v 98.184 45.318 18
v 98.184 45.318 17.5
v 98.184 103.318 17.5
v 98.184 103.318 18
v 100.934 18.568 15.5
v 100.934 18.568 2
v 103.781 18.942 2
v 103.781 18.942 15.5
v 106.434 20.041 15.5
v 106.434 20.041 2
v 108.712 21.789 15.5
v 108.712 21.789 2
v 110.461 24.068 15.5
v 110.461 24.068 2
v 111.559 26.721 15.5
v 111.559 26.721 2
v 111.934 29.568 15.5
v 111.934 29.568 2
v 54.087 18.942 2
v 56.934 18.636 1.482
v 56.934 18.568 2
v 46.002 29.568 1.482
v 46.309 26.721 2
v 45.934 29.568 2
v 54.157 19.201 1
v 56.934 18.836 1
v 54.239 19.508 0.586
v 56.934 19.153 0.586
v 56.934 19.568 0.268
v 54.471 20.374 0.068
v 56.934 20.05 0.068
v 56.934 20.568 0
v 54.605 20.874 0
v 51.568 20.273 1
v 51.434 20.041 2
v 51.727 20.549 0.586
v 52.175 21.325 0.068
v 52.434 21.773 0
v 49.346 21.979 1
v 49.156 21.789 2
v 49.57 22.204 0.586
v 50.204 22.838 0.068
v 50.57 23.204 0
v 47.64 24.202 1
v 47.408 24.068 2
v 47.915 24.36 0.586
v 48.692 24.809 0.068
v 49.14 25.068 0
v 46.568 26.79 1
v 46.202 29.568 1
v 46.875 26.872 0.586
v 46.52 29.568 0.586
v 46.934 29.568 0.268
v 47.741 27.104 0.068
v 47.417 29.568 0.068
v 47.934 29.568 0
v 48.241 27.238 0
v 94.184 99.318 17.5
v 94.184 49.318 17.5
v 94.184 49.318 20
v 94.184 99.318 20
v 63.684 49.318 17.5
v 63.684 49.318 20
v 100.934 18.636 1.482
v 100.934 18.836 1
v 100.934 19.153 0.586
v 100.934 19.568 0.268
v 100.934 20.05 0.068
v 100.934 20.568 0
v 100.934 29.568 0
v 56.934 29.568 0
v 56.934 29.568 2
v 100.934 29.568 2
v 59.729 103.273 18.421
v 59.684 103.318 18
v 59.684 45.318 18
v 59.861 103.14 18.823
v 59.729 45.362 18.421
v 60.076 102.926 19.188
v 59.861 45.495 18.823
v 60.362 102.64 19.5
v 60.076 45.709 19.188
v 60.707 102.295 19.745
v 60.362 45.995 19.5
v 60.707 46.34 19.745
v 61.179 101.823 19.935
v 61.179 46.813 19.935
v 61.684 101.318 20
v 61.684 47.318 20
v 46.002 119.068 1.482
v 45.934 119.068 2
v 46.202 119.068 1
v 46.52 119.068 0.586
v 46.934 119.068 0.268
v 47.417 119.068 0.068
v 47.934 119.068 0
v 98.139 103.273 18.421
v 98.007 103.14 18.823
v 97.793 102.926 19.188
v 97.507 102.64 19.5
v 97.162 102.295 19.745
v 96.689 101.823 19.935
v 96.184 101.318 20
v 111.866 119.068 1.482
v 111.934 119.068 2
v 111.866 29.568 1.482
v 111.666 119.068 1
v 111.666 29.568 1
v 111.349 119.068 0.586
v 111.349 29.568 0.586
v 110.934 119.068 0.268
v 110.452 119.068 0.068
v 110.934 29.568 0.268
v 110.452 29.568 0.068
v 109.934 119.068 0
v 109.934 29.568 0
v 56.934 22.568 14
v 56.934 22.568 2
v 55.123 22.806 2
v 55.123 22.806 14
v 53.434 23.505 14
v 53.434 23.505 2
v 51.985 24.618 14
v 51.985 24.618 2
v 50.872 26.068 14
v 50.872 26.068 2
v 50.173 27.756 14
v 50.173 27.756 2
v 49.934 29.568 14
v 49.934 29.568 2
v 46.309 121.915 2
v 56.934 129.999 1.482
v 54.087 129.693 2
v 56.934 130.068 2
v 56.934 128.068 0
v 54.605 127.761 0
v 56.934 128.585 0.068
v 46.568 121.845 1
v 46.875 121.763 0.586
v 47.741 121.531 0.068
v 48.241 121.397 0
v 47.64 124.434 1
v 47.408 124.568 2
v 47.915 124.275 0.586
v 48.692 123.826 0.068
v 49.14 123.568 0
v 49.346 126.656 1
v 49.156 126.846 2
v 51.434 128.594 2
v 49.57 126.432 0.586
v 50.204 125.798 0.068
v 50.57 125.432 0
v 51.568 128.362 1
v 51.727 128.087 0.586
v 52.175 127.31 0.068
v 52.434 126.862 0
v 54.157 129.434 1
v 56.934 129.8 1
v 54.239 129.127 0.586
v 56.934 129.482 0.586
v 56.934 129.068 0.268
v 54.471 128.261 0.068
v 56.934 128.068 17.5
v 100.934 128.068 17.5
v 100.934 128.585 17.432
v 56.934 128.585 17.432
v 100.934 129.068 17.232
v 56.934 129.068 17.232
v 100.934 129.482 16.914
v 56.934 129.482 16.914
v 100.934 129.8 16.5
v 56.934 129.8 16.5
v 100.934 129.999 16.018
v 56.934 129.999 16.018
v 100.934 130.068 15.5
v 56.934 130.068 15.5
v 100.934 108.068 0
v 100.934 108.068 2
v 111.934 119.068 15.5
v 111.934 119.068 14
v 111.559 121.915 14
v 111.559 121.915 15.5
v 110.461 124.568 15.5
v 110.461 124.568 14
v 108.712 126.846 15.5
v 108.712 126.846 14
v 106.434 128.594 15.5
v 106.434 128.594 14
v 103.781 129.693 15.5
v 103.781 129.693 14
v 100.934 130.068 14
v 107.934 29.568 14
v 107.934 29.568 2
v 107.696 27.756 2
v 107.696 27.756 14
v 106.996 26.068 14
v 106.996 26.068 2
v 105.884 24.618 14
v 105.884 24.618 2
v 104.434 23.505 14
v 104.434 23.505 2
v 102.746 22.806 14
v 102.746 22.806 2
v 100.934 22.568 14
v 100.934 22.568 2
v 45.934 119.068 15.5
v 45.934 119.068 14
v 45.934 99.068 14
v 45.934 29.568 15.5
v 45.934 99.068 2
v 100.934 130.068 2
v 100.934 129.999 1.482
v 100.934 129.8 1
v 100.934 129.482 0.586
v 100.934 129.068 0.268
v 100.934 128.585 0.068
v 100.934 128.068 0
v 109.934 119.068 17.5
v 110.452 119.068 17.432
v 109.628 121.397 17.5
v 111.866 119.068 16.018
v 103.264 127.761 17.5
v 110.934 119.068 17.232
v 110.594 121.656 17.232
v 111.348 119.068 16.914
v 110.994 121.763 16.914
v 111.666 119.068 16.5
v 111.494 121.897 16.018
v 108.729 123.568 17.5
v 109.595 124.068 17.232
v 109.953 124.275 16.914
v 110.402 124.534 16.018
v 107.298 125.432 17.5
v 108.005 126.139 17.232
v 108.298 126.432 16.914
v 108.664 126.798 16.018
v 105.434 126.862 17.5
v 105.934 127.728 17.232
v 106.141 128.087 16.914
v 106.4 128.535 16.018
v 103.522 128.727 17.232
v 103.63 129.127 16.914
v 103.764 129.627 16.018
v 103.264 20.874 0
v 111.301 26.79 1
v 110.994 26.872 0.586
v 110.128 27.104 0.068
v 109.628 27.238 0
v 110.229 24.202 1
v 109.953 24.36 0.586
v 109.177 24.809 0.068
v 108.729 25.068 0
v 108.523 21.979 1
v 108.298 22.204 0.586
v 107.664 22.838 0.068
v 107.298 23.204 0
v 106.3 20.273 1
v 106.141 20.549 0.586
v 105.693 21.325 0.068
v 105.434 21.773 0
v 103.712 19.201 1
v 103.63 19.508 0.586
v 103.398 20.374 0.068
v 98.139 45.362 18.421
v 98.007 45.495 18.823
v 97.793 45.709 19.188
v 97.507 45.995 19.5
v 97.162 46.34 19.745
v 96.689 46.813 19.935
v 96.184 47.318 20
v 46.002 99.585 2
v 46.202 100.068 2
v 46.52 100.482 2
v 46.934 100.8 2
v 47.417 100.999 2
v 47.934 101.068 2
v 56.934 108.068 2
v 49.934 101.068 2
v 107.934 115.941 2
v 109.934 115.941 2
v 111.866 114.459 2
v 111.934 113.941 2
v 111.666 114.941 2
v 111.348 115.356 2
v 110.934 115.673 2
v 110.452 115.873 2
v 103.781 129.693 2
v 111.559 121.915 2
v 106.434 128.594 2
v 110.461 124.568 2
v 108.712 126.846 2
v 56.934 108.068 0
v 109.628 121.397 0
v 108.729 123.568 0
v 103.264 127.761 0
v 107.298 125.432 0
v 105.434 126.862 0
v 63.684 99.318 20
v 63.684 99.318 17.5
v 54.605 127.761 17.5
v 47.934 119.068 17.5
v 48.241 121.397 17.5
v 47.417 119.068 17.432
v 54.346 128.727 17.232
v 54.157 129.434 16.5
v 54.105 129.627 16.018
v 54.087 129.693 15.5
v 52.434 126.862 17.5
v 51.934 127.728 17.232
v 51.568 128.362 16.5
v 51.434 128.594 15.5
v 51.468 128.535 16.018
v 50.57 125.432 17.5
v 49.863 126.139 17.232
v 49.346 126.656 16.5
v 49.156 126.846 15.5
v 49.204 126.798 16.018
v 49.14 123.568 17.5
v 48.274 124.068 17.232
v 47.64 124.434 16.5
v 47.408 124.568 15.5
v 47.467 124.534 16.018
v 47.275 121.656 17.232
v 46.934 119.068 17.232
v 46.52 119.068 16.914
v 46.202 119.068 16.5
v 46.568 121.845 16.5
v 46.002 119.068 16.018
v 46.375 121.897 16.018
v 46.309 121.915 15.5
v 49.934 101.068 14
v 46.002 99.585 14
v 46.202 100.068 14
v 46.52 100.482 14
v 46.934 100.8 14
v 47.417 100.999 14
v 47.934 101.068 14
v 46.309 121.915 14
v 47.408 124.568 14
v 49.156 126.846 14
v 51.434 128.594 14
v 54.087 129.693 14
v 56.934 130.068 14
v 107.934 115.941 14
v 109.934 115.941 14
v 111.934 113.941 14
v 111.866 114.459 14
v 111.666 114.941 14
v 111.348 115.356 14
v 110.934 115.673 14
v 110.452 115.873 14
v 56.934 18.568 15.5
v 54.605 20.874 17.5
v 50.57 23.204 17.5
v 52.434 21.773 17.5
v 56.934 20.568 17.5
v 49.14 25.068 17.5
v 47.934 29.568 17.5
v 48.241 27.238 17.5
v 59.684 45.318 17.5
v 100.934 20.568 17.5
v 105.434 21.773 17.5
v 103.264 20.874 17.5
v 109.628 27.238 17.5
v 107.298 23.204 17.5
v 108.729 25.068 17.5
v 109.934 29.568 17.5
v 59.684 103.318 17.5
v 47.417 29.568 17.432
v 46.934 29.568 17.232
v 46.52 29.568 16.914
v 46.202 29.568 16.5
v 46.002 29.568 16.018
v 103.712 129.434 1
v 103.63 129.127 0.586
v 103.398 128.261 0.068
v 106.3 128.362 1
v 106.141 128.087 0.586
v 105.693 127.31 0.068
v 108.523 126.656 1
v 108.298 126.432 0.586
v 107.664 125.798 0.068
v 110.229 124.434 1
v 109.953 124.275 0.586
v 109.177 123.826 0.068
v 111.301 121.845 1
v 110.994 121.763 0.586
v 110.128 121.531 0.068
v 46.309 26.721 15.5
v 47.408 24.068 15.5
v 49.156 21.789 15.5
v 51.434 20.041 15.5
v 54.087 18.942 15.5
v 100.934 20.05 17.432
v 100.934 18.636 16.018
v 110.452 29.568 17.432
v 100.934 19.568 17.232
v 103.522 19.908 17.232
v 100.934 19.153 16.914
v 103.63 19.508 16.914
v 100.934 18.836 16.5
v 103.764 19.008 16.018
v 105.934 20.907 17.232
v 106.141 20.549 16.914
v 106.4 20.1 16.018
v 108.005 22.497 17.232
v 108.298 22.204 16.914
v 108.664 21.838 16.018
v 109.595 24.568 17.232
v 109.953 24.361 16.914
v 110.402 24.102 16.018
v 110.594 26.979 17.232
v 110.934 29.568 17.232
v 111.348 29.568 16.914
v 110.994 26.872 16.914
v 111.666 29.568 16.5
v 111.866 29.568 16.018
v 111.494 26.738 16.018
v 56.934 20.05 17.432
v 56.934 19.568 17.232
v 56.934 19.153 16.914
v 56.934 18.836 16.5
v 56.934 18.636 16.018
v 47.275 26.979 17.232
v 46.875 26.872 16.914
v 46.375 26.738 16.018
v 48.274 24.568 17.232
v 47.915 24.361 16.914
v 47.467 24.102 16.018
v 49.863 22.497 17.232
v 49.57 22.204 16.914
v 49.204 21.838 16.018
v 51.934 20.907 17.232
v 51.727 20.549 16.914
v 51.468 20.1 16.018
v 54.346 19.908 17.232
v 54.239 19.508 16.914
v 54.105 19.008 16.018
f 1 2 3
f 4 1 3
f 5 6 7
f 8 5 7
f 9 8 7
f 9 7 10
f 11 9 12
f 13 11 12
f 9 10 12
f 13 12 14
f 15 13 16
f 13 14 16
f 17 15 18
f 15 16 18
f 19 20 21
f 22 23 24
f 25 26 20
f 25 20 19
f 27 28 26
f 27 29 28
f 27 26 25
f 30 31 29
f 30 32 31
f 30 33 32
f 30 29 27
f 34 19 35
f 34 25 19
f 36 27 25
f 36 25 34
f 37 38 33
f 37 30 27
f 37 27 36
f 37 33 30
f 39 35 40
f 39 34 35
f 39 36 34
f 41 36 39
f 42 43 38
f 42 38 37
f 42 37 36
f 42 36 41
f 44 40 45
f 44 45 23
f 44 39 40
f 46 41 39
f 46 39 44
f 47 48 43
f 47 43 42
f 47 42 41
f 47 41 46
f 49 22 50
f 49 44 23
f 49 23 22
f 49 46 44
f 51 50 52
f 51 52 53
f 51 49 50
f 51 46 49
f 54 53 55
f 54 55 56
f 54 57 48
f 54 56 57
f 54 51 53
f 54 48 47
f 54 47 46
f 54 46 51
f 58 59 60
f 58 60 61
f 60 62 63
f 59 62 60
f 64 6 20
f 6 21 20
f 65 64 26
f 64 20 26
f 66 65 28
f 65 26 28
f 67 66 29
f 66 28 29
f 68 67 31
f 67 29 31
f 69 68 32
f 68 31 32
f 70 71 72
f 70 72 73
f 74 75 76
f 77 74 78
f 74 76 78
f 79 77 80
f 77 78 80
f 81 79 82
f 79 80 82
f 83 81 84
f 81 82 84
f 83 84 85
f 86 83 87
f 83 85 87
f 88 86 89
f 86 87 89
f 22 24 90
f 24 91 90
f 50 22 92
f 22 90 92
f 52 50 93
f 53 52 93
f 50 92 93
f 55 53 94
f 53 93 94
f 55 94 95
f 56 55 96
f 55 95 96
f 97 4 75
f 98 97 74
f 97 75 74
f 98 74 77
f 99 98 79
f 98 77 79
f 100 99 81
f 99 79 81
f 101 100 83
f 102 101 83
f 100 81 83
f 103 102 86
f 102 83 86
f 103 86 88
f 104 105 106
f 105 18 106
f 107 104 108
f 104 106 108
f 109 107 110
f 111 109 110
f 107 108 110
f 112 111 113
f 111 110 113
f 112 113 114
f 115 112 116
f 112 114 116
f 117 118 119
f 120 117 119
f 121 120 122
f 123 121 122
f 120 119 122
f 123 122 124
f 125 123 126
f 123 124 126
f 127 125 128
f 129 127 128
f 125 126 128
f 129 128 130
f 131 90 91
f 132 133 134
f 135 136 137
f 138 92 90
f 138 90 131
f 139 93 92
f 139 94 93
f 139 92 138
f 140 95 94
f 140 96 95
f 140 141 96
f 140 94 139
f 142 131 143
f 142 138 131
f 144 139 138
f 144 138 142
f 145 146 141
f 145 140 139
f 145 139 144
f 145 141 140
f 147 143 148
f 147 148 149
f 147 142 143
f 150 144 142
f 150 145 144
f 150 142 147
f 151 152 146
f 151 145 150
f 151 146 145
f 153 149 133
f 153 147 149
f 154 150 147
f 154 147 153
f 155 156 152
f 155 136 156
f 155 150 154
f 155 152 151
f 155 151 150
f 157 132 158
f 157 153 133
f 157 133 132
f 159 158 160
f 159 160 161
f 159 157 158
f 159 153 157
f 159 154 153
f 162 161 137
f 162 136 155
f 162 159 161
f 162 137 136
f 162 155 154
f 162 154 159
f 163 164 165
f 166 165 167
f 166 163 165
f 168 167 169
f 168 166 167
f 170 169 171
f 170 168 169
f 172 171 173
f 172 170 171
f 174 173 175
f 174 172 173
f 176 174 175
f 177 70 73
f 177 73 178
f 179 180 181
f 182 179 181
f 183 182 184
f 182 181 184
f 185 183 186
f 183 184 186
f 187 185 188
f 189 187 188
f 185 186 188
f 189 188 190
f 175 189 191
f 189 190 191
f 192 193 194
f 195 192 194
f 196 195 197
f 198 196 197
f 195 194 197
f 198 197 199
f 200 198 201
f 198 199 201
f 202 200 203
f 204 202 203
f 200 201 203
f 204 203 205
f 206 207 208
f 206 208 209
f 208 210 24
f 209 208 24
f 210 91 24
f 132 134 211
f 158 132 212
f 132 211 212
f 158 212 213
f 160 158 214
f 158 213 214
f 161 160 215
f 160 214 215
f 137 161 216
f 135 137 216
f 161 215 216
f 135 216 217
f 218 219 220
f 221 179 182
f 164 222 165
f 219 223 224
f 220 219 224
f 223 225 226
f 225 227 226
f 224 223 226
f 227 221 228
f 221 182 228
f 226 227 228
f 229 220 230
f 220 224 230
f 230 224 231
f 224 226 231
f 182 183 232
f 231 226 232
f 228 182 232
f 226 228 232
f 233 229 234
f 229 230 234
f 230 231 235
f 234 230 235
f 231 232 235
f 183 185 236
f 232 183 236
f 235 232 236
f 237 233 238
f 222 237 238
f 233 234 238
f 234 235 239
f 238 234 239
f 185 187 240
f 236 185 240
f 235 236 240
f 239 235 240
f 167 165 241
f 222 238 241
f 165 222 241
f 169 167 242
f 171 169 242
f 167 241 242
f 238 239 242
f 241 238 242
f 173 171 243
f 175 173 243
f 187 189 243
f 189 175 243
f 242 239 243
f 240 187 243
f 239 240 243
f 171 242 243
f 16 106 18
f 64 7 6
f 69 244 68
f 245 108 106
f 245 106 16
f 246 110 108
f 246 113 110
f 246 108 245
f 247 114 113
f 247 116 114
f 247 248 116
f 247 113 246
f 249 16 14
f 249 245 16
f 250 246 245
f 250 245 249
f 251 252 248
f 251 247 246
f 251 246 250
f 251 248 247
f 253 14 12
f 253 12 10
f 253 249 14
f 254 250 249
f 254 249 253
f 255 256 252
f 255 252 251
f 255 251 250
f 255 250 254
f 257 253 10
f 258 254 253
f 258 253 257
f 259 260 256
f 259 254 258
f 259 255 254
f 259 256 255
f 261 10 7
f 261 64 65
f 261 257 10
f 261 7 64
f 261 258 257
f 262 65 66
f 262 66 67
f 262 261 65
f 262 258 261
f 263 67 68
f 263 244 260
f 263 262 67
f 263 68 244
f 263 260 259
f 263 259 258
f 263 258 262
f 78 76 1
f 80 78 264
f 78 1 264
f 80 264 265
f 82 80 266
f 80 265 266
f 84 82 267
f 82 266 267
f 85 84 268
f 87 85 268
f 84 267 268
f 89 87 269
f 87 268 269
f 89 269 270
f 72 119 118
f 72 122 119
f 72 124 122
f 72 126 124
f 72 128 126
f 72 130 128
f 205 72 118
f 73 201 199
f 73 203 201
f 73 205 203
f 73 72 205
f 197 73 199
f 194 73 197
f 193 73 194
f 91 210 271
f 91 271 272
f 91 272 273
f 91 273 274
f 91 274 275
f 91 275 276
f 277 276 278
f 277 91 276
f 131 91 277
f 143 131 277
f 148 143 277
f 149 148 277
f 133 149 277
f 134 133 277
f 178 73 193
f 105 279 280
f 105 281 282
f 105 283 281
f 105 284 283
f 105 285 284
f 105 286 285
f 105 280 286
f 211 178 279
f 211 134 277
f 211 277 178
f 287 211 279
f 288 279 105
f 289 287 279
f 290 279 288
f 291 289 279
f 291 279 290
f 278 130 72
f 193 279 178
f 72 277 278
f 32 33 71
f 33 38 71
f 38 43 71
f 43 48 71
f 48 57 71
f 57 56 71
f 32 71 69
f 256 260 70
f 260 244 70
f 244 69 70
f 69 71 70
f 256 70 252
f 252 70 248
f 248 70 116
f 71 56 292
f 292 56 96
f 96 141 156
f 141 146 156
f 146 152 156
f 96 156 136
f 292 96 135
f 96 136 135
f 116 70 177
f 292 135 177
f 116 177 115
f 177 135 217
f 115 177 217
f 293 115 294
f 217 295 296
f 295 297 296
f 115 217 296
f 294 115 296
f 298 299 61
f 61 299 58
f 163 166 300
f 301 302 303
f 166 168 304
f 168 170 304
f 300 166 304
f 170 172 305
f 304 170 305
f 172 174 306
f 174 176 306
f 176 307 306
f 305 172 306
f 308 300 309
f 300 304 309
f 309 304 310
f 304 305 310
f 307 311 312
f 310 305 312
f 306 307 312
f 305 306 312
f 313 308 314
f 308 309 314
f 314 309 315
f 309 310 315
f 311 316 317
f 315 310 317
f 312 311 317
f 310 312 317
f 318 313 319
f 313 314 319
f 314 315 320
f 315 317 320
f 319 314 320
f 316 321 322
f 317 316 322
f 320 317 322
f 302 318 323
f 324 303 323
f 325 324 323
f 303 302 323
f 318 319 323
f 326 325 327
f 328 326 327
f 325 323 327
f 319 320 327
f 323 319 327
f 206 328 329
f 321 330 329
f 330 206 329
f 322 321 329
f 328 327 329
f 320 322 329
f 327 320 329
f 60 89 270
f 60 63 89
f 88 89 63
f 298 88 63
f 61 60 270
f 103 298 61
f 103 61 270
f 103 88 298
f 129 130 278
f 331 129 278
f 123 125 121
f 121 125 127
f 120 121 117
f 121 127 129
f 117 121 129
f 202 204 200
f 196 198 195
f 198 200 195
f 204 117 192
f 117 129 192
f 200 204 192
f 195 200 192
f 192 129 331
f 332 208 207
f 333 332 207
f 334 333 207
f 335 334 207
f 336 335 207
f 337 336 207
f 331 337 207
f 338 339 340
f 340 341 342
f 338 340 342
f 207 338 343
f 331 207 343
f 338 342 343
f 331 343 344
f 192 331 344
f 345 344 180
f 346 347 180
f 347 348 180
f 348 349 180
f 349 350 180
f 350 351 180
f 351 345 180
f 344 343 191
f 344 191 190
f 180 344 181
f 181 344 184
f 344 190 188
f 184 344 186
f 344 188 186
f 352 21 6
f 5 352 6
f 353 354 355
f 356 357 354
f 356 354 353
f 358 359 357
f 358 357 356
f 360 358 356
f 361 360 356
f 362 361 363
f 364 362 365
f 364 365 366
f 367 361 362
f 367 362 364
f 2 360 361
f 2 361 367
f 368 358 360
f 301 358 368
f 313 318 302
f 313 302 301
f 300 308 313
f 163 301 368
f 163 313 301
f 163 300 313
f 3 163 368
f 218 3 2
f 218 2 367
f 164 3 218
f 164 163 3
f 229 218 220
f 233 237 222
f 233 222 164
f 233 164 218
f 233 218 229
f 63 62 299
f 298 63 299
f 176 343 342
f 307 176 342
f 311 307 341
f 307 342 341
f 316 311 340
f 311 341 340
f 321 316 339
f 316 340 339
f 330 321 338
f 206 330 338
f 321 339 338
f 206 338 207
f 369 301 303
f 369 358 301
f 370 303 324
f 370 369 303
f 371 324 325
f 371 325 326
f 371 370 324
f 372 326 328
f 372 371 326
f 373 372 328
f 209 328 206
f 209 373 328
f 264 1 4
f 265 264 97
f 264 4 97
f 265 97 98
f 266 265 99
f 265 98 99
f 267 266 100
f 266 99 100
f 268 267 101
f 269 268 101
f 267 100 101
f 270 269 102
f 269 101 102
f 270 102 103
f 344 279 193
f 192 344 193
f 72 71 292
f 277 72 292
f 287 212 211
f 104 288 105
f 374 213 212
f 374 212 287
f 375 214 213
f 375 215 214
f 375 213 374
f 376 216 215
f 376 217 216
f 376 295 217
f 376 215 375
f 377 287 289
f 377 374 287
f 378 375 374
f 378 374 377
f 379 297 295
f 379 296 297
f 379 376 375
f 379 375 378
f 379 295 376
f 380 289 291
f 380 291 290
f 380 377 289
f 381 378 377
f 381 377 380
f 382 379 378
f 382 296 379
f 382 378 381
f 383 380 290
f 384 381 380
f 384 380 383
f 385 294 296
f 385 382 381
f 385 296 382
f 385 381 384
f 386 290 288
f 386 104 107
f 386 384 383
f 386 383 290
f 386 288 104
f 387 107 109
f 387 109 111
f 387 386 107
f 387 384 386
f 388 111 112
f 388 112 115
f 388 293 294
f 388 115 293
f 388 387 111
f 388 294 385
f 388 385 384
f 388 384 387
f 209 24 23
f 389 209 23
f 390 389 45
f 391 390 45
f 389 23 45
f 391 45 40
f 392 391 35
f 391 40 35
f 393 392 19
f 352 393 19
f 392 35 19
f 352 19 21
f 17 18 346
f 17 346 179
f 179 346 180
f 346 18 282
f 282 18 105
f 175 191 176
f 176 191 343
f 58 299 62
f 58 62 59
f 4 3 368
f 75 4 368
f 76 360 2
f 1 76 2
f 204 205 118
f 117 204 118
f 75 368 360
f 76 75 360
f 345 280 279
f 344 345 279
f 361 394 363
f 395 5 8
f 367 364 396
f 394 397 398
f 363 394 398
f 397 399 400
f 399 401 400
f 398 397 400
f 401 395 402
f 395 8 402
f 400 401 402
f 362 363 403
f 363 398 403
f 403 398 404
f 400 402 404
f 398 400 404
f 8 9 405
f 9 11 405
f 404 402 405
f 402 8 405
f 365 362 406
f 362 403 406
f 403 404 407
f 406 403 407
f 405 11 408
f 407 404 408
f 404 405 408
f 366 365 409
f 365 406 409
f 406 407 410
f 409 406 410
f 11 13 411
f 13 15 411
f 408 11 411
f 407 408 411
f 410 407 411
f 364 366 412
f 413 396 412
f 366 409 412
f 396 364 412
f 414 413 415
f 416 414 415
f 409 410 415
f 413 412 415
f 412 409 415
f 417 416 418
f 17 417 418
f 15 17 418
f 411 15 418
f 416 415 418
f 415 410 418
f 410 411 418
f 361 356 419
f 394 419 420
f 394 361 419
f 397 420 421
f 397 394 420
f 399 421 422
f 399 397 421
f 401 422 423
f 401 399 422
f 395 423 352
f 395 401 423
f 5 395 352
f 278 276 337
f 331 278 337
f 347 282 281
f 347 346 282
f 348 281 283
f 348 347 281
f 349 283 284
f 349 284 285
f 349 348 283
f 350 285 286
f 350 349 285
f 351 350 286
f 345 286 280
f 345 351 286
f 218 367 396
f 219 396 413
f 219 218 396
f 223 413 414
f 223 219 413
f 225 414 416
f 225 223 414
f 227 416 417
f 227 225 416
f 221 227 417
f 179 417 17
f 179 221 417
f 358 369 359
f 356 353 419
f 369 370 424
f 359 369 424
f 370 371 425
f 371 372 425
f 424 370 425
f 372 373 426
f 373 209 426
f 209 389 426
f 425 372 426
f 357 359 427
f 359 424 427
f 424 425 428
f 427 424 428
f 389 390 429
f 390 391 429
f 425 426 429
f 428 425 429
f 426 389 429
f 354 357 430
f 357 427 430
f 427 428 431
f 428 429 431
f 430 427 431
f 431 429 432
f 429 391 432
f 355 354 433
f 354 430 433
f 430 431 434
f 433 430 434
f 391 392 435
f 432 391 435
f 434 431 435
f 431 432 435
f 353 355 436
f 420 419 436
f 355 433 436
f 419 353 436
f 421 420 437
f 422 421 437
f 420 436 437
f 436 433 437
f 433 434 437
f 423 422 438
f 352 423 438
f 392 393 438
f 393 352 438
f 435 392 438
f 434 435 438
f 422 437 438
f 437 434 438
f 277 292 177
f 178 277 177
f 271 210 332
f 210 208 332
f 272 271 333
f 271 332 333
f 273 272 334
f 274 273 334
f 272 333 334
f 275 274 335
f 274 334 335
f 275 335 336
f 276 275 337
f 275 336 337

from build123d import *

# Parameters (mm, degrees)
CROQUIS1_W              = 44
CROQUIS1_H              = 78.5
SALIENTE_EXTRUIR1_DEPTH = 2
SALIENTE_EXTRUIR2_DEPTH = 12
CROQUIS3_W              = 44
CROQUIS3_H              = 78.5
SALIENTE_EXTRUIR3_DEPTH = 3.5
CROQUIS4_W              = 30.5
CROQUIS4_H              = 50
SALIENTE_EXTRUIR4_DEPTH = 2.5
CROQUIS6_W              = 12
CROQUIS6_H              = 14.873801133
CORTAR_EXTRUIR3_DEPTH   = 4
REDONDEO2_R             = 2
REDONDEO3_R             = 2
REDONDEO4_R             = 2
REDONDEO5_R             = 2
REDONDEO6_R             = 2


with BuildPart() as part:
    # Croquis1 → Saliente-Extruir1 (new body)
    # profile 1 of 2: a face of its own
    with BuildSketch(Plane.XY):
        with BuildLine():
            Line((45.934272818, 29.567618865), (45.934272818, 119.067618865))
            ThreePointArc((45.934272818, 119.067618865), (49.156098225, 126.845793458), (56.934272818, 130.067618865))
            Line((56.934272818, 130.067618865), (100.934272818, 130.067618865))
            ThreePointArc((100.934272818, 130.067618865), (108.712447411, 126.845793458), (111.934272818, 119.067618865))
            Line((111.934272818, 119.067618865), (111.934272818, 29.567618865))
            ThreePointArc((111.934272818, 29.567618865), (108.712447411, 21.789444272), (100.934272818, 18.567618865))
            Line((100.934272818, 18.567618865), (56.934272818, 18.567618865))
            ThreePointArc((56.934272818, 18.567618865), (49.156098225, 21.789444272), (45.934272818, 29.567618865))
        make_face()
        with BuildLine():
            ThreePointArc((56.934272818, 126.067618865), (51.98452535, 124.017366333), (49.934272818, 119.067618865))
            Line((49.934272818, 119.067618865), (49.934272818, 29.567618865))
            ThreePointArc((49.934272818, 29.567618865), (51.98452535, 24.617871397), (56.934272818, 22.567618865))
            Line((56.934272818, 22.567618865), (100.934272818, 22.567618865))
            ThreePointArc((100.934272818, 22.567618865), (105.884020287, 24.617871397), (107.934272818, 29.567618865))
            Line((107.934272818, 29.567618865), (107.934272818, 119.067618865))
            ThreePointArc((107.934272818, 119.067618865), (105.884020287, 124.017366333), (100.934272818, 126.067618865))
            Line((100.934272818, 126.067618865), (56.934272818, 126.067618865))
        make_face(mode=Mode.SUBTRACT)
    # profile 2 of 2: a face of its own
    with BuildSketch(Plane.XY):
        with BuildLine():
            Line((100.934272818, 126.067618865), (56.934272818, 126.067618865))
            ThreePointArc((56.934272818, 126.067618865), (51.98452535, 124.017366333), (49.934272818, 119.067618865))
            Line((49.934272818, 119.067618865), (49.934272818, 29.567618865))
            ThreePointArc((49.934272818, 29.567618865), (51.98452535, 24.617871397), (56.934272818, 22.567618865))
            Line((56.934272818, 22.567618865), (100.934272818, 22.567618865))
            ThreePointArc((100.934272818, 22.567618865), (105.884020287, 24.617871397), (107.934272818, 29.567618865))
            Line((107.934272818, 29.567618865), (107.934272818, 119.067618865))
            ThreePointArc((107.934272818, 119.067618865), (105.884020287, 124.017366333), (100.934272818, 126.067618865))
        make_face()
        with Locations((78.934272818, 68.817618865)):
            Rectangle(CROQUIS1_W, CROQUIS1_H, mode=Mode.SUBTRACT)
    extrude(amount=SALIENTE_EXTRUIR1_DEPTH)

    # Croquis2 → Saliente-Extruir2 (add)
    with BuildSketch(Plane.XY.offset(2)):
        with BuildLine():
            Line((100.934272818, 22.567618865), (56.934272818, 22.567618865))
            ThreePointArc((56.934272818, 22.567618865), (51.98452535, 24.617871397), (49.934272818, 29.567618865))
            Line((49.934272818, 29.567618865), (49.934272818, 115.941419998))
            Line((49.934272818, 115.941419998), (45.934272818, 115.941419998))
            Line((45.934272818, 115.941419998), (45.934272818, 29.567618865))
            ThreePointArc((45.934272818, 29.567618865), (49.156098225, 21.789444272), (56.934272818, 18.567618865))
            Line((56.934272818, 18.567618865), (100.934272818, 18.567618865))
            ThreePointArc((100.934272818, 18.567618865), (108.712447411, 21.789444272), (111.934272818, 29.567618865))
            Line((111.934272818, 29.567618865), (111.934272818, 115.941419998))
            Line((111.934272818, 115.941419998), (107.934272818, 115.941419998))
            Line((107.934272818, 115.941419998), (107.934272818, 29.567618865))
            ThreePointArc((107.934272818, 29.567618865), (105.884020287, 24.617871397), (100.934272818, 22.567618865))
        make_face()
    extrude(amount=SALIENTE_EXTRUIR2_DEPTH)

    # Croquis3 → Saliente-Extruir3 (add)
    # profile 1 of 4: a face of its own
    with BuildSketch(Plane.XY.offset(14)):
        with BuildLine():
            Line((45.934272818, 115.941419998), (49.934272818, 115.941419998))
            Line((49.934272818, 115.941419998), (49.934272818, 119.067618865))
            ThreePointArc((49.934272818, 119.067618865), (51.98452535, 124.017366333), (56.934272818, 126.067618865))
            Line((56.934272818, 126.067618865), (100.934272818, 126.067618865))
            ThreePointArc((100.934272818, 126.067618865), (105.884020287, 124.017366333), (107.934272818, 119.067618865))
            Line((107.934272818, 119.067618865), (107.934272818, 115.941419998))
            Line((107.934272818, 115.941419998), (111.934272818, 115.941419998))
            Line((111.934272818, 115.941419998), (111.934272818, 119.067618865))
            ThreePointArc((111.934272818, 119.067618865), (108.712447411, 126.845793458), (100.934272818, 130.067618865))
            Line((100.934272818, 130.067618865), (56.934272818, 130.067618865))
            ThreePointArc((56.934272818, 130.067618865), (49.156098225, 126.845793458), (45.934272818, 119.067618865))
            Line((45.934272818, 119.067618865), (45.934272818, 115.941419998))
        make_face()
    # profile 2 of 4: a face of its own
    with BuildSketch(Plane.XY.offset(14)):
        with BuildLine():
            Line((107.934272818, 115.941419998), (107.934272818, 29.567618865))
            ThreePointArc((107.934272818, 29.567618865), (105.884020287, 24.617871397), (100.934272818, 22.567618865))
            Line((100.934272818, 22.567618865), (56.934272818, 22.567618865))
            ThreePointArc((56.934272818, 22.567618865), (51.98452535, 24.617871397), (49.934272818, 29.567618865))
            Line((49.934272818, 29.567618865), (49.934272818, 115.941419998))
            Line((49.934272818, 115.941419998), (45.934272818, 115.941419998))
            Line((45.934272818, 115.941419998), (45.934272818, 29.567618865))
            ThreePointArc((45.934272818, 29.567618865), (49.156098225, 21.789444272), (56.934272818, 18.567618865))
            Line((56.934272818, 18.567618865), (100.934272818, 18.567618865))
            ThreePointArc((100.934272818, 18.567618865), (108.712447411, 21.789444272), (111.934272818, 29.567618865))
            Line((111.934272818, 29.567618865), (111.934272818, 115.941419998))
            Line((111.934272818, 115.941419998), (107.934272818, 115.941419998))
        make_face()
    # profile 3 of 4: a face of its own
    with BuildSketch(Plane.XY.offset(14)):
        with BuildLine():
            ThreePointArc((49.934272818, 29.567618865), (51.98452535, 24.617871397), (56.934272818, 22.567618865))
            Line((56.934272818, 22.567618865), (100.934272818, 22.567618865))
            ThreePointArc((100.934272818, 22.567618865), (105.884020287, 24.617871397), (107.934272818, 29.567618865))
            Line((107.934272818, 29.567618865), (107.934272818, 115.941419998))
            Line((107.934272818, 115.941419998), (107.934272818, 119.067618865))
            ThreePointArc((107.934272818, 119.067618865), (105.884020287, 124.017366333), (100.934272818, 126.067618865))
            Line((100.934272818, 126.067618865), (56.934272818, 126.067618865))
            ThreePointArc((56.934272818, 126.067618865), (51.98452535, 124.017366333), (49.934272818, 119.067618865))
            Line((49.934272818, 119.067618865), (49.934272818, 115.941419998))
            Line((49.934272818, 115.941419998), (49.934272818, 29.567618865))
        make_face()
        with Locations((78.934272818, 68.817618865)):
            Rectangle(CROQUIS3_W, CROQUIS3_H, mode=Mode.SUBTRACT)
    # profile 4 of 4: a face of its own
    with BuildSketch(Plane.XY.offset(14)):
        with Locations((78.934272818, 68.817618865)):
            Rectangle(CROQUIS3_W, CROQUIS3_H)
    extrude(amount=SALIENTE_EXTRUIR3_DEPTH)

    # Croquis4 → Saliente-Extruir4 (add)
    with BuildSketch(Plane.XY.offset(17.5)):
        Polygon((59.684272818, 103.317618865), (59.684272818, 99.317618865), (59.684272818, 45.317618865), (98.184272818, 45.317618865), (98.184272818, 103.317618865), align=None)
        with Locations((78.934272818, 74.317618865)):
            Rectangle(CROQUIS4_W, CROQUIS4_H, mode=Mode.SUBTRACT)
    extrude(amount=SALIENTE_EXTRUIR4_DEPTH)

    # Croquis6 → Cortar-Extruir3 (cut)
    with BuildSketch(Plane.ZY.offset(-45.934272818)):
        with Locations((8, 108.504519432)):
            Rectangle(CROQUIS6_W, CROQUIS6_H)
    extrude(amount=-CORTAR_EXTRUIR3_DEPTH, mode=Mode.SUBTRACT)

    # Redondeo2
    redondeo2_edges = [part.edges().sort_by_distance(p)[0] for p in [
        (78.934272818, 18.567618865, 0),
        (108.712447411, 21.789444272, 0),
        (111.934272818, 74.317618865, 0),
        (108.712447411, 126.845793458, 0),
        (78.934272818, 130.067618865, 0),
        (49.156098225, 126.845793458, 0),
        (45.934272818, 74.317618865, 0),
        (49.156098225, 21.789444272, 0),
    ]]
    fillet(redondeo2_edges, radius=REDONDEO2_R - 0.0001)  # a hair under: the kernel refuses the full size

    # Redondeo3
    redondeo3_edges = [part.edges().sort_by_distance(p)[0] for p in [
        (45.934272818, 74.317618865, 17.5),
        (78.934272818, 130.067618865, 17.5),
        (49.156098225, 21.789444272, 17.5),
        (78.934272818, 18.567618865, 17.5),
        (108.712447411, 21.789444272, 17.5),
        (111.934272818, 74.317618865, 17.5),
        (108.712447411, 126.845793458, 17.5),
        (49.156098225, 126.845793458, 17.5),
    ]]
    fillet(redondeo3_edges, radius=REDONDEO3_R)

    # Redondeo4
    redondeo4_edges = [part.edges().sort_by_distance(p)[0] for p in [
        (59.684272818, 74.317618865, 20),
        (78.934272818, 45.317618865, 20),
        (98.184272818, 74.317618865, 20),
        (78.934272818, 103.317618865, 20),
    ]]
    fillet(redondeo4_edges, radius=REDONDEO4_R)

    # Redondeo5
    redondeo5_edges = [part.edges().sort_by_distance(p)[0] for p in [
        (45.934272818, 101.067618865, 8),
    ]]
    fillet(redondeo5_edges, radius=REDONDEO5_R)

    # Redondeo6
    redondeo6_edges = [part.edges().sort_by_distance(p)[0] for p in [
        (111.934272818, 115.941419998, 8),
    ]]
    fillet(redondeo6_edges, radius=REDONDEO6_R)


solid = part.part
